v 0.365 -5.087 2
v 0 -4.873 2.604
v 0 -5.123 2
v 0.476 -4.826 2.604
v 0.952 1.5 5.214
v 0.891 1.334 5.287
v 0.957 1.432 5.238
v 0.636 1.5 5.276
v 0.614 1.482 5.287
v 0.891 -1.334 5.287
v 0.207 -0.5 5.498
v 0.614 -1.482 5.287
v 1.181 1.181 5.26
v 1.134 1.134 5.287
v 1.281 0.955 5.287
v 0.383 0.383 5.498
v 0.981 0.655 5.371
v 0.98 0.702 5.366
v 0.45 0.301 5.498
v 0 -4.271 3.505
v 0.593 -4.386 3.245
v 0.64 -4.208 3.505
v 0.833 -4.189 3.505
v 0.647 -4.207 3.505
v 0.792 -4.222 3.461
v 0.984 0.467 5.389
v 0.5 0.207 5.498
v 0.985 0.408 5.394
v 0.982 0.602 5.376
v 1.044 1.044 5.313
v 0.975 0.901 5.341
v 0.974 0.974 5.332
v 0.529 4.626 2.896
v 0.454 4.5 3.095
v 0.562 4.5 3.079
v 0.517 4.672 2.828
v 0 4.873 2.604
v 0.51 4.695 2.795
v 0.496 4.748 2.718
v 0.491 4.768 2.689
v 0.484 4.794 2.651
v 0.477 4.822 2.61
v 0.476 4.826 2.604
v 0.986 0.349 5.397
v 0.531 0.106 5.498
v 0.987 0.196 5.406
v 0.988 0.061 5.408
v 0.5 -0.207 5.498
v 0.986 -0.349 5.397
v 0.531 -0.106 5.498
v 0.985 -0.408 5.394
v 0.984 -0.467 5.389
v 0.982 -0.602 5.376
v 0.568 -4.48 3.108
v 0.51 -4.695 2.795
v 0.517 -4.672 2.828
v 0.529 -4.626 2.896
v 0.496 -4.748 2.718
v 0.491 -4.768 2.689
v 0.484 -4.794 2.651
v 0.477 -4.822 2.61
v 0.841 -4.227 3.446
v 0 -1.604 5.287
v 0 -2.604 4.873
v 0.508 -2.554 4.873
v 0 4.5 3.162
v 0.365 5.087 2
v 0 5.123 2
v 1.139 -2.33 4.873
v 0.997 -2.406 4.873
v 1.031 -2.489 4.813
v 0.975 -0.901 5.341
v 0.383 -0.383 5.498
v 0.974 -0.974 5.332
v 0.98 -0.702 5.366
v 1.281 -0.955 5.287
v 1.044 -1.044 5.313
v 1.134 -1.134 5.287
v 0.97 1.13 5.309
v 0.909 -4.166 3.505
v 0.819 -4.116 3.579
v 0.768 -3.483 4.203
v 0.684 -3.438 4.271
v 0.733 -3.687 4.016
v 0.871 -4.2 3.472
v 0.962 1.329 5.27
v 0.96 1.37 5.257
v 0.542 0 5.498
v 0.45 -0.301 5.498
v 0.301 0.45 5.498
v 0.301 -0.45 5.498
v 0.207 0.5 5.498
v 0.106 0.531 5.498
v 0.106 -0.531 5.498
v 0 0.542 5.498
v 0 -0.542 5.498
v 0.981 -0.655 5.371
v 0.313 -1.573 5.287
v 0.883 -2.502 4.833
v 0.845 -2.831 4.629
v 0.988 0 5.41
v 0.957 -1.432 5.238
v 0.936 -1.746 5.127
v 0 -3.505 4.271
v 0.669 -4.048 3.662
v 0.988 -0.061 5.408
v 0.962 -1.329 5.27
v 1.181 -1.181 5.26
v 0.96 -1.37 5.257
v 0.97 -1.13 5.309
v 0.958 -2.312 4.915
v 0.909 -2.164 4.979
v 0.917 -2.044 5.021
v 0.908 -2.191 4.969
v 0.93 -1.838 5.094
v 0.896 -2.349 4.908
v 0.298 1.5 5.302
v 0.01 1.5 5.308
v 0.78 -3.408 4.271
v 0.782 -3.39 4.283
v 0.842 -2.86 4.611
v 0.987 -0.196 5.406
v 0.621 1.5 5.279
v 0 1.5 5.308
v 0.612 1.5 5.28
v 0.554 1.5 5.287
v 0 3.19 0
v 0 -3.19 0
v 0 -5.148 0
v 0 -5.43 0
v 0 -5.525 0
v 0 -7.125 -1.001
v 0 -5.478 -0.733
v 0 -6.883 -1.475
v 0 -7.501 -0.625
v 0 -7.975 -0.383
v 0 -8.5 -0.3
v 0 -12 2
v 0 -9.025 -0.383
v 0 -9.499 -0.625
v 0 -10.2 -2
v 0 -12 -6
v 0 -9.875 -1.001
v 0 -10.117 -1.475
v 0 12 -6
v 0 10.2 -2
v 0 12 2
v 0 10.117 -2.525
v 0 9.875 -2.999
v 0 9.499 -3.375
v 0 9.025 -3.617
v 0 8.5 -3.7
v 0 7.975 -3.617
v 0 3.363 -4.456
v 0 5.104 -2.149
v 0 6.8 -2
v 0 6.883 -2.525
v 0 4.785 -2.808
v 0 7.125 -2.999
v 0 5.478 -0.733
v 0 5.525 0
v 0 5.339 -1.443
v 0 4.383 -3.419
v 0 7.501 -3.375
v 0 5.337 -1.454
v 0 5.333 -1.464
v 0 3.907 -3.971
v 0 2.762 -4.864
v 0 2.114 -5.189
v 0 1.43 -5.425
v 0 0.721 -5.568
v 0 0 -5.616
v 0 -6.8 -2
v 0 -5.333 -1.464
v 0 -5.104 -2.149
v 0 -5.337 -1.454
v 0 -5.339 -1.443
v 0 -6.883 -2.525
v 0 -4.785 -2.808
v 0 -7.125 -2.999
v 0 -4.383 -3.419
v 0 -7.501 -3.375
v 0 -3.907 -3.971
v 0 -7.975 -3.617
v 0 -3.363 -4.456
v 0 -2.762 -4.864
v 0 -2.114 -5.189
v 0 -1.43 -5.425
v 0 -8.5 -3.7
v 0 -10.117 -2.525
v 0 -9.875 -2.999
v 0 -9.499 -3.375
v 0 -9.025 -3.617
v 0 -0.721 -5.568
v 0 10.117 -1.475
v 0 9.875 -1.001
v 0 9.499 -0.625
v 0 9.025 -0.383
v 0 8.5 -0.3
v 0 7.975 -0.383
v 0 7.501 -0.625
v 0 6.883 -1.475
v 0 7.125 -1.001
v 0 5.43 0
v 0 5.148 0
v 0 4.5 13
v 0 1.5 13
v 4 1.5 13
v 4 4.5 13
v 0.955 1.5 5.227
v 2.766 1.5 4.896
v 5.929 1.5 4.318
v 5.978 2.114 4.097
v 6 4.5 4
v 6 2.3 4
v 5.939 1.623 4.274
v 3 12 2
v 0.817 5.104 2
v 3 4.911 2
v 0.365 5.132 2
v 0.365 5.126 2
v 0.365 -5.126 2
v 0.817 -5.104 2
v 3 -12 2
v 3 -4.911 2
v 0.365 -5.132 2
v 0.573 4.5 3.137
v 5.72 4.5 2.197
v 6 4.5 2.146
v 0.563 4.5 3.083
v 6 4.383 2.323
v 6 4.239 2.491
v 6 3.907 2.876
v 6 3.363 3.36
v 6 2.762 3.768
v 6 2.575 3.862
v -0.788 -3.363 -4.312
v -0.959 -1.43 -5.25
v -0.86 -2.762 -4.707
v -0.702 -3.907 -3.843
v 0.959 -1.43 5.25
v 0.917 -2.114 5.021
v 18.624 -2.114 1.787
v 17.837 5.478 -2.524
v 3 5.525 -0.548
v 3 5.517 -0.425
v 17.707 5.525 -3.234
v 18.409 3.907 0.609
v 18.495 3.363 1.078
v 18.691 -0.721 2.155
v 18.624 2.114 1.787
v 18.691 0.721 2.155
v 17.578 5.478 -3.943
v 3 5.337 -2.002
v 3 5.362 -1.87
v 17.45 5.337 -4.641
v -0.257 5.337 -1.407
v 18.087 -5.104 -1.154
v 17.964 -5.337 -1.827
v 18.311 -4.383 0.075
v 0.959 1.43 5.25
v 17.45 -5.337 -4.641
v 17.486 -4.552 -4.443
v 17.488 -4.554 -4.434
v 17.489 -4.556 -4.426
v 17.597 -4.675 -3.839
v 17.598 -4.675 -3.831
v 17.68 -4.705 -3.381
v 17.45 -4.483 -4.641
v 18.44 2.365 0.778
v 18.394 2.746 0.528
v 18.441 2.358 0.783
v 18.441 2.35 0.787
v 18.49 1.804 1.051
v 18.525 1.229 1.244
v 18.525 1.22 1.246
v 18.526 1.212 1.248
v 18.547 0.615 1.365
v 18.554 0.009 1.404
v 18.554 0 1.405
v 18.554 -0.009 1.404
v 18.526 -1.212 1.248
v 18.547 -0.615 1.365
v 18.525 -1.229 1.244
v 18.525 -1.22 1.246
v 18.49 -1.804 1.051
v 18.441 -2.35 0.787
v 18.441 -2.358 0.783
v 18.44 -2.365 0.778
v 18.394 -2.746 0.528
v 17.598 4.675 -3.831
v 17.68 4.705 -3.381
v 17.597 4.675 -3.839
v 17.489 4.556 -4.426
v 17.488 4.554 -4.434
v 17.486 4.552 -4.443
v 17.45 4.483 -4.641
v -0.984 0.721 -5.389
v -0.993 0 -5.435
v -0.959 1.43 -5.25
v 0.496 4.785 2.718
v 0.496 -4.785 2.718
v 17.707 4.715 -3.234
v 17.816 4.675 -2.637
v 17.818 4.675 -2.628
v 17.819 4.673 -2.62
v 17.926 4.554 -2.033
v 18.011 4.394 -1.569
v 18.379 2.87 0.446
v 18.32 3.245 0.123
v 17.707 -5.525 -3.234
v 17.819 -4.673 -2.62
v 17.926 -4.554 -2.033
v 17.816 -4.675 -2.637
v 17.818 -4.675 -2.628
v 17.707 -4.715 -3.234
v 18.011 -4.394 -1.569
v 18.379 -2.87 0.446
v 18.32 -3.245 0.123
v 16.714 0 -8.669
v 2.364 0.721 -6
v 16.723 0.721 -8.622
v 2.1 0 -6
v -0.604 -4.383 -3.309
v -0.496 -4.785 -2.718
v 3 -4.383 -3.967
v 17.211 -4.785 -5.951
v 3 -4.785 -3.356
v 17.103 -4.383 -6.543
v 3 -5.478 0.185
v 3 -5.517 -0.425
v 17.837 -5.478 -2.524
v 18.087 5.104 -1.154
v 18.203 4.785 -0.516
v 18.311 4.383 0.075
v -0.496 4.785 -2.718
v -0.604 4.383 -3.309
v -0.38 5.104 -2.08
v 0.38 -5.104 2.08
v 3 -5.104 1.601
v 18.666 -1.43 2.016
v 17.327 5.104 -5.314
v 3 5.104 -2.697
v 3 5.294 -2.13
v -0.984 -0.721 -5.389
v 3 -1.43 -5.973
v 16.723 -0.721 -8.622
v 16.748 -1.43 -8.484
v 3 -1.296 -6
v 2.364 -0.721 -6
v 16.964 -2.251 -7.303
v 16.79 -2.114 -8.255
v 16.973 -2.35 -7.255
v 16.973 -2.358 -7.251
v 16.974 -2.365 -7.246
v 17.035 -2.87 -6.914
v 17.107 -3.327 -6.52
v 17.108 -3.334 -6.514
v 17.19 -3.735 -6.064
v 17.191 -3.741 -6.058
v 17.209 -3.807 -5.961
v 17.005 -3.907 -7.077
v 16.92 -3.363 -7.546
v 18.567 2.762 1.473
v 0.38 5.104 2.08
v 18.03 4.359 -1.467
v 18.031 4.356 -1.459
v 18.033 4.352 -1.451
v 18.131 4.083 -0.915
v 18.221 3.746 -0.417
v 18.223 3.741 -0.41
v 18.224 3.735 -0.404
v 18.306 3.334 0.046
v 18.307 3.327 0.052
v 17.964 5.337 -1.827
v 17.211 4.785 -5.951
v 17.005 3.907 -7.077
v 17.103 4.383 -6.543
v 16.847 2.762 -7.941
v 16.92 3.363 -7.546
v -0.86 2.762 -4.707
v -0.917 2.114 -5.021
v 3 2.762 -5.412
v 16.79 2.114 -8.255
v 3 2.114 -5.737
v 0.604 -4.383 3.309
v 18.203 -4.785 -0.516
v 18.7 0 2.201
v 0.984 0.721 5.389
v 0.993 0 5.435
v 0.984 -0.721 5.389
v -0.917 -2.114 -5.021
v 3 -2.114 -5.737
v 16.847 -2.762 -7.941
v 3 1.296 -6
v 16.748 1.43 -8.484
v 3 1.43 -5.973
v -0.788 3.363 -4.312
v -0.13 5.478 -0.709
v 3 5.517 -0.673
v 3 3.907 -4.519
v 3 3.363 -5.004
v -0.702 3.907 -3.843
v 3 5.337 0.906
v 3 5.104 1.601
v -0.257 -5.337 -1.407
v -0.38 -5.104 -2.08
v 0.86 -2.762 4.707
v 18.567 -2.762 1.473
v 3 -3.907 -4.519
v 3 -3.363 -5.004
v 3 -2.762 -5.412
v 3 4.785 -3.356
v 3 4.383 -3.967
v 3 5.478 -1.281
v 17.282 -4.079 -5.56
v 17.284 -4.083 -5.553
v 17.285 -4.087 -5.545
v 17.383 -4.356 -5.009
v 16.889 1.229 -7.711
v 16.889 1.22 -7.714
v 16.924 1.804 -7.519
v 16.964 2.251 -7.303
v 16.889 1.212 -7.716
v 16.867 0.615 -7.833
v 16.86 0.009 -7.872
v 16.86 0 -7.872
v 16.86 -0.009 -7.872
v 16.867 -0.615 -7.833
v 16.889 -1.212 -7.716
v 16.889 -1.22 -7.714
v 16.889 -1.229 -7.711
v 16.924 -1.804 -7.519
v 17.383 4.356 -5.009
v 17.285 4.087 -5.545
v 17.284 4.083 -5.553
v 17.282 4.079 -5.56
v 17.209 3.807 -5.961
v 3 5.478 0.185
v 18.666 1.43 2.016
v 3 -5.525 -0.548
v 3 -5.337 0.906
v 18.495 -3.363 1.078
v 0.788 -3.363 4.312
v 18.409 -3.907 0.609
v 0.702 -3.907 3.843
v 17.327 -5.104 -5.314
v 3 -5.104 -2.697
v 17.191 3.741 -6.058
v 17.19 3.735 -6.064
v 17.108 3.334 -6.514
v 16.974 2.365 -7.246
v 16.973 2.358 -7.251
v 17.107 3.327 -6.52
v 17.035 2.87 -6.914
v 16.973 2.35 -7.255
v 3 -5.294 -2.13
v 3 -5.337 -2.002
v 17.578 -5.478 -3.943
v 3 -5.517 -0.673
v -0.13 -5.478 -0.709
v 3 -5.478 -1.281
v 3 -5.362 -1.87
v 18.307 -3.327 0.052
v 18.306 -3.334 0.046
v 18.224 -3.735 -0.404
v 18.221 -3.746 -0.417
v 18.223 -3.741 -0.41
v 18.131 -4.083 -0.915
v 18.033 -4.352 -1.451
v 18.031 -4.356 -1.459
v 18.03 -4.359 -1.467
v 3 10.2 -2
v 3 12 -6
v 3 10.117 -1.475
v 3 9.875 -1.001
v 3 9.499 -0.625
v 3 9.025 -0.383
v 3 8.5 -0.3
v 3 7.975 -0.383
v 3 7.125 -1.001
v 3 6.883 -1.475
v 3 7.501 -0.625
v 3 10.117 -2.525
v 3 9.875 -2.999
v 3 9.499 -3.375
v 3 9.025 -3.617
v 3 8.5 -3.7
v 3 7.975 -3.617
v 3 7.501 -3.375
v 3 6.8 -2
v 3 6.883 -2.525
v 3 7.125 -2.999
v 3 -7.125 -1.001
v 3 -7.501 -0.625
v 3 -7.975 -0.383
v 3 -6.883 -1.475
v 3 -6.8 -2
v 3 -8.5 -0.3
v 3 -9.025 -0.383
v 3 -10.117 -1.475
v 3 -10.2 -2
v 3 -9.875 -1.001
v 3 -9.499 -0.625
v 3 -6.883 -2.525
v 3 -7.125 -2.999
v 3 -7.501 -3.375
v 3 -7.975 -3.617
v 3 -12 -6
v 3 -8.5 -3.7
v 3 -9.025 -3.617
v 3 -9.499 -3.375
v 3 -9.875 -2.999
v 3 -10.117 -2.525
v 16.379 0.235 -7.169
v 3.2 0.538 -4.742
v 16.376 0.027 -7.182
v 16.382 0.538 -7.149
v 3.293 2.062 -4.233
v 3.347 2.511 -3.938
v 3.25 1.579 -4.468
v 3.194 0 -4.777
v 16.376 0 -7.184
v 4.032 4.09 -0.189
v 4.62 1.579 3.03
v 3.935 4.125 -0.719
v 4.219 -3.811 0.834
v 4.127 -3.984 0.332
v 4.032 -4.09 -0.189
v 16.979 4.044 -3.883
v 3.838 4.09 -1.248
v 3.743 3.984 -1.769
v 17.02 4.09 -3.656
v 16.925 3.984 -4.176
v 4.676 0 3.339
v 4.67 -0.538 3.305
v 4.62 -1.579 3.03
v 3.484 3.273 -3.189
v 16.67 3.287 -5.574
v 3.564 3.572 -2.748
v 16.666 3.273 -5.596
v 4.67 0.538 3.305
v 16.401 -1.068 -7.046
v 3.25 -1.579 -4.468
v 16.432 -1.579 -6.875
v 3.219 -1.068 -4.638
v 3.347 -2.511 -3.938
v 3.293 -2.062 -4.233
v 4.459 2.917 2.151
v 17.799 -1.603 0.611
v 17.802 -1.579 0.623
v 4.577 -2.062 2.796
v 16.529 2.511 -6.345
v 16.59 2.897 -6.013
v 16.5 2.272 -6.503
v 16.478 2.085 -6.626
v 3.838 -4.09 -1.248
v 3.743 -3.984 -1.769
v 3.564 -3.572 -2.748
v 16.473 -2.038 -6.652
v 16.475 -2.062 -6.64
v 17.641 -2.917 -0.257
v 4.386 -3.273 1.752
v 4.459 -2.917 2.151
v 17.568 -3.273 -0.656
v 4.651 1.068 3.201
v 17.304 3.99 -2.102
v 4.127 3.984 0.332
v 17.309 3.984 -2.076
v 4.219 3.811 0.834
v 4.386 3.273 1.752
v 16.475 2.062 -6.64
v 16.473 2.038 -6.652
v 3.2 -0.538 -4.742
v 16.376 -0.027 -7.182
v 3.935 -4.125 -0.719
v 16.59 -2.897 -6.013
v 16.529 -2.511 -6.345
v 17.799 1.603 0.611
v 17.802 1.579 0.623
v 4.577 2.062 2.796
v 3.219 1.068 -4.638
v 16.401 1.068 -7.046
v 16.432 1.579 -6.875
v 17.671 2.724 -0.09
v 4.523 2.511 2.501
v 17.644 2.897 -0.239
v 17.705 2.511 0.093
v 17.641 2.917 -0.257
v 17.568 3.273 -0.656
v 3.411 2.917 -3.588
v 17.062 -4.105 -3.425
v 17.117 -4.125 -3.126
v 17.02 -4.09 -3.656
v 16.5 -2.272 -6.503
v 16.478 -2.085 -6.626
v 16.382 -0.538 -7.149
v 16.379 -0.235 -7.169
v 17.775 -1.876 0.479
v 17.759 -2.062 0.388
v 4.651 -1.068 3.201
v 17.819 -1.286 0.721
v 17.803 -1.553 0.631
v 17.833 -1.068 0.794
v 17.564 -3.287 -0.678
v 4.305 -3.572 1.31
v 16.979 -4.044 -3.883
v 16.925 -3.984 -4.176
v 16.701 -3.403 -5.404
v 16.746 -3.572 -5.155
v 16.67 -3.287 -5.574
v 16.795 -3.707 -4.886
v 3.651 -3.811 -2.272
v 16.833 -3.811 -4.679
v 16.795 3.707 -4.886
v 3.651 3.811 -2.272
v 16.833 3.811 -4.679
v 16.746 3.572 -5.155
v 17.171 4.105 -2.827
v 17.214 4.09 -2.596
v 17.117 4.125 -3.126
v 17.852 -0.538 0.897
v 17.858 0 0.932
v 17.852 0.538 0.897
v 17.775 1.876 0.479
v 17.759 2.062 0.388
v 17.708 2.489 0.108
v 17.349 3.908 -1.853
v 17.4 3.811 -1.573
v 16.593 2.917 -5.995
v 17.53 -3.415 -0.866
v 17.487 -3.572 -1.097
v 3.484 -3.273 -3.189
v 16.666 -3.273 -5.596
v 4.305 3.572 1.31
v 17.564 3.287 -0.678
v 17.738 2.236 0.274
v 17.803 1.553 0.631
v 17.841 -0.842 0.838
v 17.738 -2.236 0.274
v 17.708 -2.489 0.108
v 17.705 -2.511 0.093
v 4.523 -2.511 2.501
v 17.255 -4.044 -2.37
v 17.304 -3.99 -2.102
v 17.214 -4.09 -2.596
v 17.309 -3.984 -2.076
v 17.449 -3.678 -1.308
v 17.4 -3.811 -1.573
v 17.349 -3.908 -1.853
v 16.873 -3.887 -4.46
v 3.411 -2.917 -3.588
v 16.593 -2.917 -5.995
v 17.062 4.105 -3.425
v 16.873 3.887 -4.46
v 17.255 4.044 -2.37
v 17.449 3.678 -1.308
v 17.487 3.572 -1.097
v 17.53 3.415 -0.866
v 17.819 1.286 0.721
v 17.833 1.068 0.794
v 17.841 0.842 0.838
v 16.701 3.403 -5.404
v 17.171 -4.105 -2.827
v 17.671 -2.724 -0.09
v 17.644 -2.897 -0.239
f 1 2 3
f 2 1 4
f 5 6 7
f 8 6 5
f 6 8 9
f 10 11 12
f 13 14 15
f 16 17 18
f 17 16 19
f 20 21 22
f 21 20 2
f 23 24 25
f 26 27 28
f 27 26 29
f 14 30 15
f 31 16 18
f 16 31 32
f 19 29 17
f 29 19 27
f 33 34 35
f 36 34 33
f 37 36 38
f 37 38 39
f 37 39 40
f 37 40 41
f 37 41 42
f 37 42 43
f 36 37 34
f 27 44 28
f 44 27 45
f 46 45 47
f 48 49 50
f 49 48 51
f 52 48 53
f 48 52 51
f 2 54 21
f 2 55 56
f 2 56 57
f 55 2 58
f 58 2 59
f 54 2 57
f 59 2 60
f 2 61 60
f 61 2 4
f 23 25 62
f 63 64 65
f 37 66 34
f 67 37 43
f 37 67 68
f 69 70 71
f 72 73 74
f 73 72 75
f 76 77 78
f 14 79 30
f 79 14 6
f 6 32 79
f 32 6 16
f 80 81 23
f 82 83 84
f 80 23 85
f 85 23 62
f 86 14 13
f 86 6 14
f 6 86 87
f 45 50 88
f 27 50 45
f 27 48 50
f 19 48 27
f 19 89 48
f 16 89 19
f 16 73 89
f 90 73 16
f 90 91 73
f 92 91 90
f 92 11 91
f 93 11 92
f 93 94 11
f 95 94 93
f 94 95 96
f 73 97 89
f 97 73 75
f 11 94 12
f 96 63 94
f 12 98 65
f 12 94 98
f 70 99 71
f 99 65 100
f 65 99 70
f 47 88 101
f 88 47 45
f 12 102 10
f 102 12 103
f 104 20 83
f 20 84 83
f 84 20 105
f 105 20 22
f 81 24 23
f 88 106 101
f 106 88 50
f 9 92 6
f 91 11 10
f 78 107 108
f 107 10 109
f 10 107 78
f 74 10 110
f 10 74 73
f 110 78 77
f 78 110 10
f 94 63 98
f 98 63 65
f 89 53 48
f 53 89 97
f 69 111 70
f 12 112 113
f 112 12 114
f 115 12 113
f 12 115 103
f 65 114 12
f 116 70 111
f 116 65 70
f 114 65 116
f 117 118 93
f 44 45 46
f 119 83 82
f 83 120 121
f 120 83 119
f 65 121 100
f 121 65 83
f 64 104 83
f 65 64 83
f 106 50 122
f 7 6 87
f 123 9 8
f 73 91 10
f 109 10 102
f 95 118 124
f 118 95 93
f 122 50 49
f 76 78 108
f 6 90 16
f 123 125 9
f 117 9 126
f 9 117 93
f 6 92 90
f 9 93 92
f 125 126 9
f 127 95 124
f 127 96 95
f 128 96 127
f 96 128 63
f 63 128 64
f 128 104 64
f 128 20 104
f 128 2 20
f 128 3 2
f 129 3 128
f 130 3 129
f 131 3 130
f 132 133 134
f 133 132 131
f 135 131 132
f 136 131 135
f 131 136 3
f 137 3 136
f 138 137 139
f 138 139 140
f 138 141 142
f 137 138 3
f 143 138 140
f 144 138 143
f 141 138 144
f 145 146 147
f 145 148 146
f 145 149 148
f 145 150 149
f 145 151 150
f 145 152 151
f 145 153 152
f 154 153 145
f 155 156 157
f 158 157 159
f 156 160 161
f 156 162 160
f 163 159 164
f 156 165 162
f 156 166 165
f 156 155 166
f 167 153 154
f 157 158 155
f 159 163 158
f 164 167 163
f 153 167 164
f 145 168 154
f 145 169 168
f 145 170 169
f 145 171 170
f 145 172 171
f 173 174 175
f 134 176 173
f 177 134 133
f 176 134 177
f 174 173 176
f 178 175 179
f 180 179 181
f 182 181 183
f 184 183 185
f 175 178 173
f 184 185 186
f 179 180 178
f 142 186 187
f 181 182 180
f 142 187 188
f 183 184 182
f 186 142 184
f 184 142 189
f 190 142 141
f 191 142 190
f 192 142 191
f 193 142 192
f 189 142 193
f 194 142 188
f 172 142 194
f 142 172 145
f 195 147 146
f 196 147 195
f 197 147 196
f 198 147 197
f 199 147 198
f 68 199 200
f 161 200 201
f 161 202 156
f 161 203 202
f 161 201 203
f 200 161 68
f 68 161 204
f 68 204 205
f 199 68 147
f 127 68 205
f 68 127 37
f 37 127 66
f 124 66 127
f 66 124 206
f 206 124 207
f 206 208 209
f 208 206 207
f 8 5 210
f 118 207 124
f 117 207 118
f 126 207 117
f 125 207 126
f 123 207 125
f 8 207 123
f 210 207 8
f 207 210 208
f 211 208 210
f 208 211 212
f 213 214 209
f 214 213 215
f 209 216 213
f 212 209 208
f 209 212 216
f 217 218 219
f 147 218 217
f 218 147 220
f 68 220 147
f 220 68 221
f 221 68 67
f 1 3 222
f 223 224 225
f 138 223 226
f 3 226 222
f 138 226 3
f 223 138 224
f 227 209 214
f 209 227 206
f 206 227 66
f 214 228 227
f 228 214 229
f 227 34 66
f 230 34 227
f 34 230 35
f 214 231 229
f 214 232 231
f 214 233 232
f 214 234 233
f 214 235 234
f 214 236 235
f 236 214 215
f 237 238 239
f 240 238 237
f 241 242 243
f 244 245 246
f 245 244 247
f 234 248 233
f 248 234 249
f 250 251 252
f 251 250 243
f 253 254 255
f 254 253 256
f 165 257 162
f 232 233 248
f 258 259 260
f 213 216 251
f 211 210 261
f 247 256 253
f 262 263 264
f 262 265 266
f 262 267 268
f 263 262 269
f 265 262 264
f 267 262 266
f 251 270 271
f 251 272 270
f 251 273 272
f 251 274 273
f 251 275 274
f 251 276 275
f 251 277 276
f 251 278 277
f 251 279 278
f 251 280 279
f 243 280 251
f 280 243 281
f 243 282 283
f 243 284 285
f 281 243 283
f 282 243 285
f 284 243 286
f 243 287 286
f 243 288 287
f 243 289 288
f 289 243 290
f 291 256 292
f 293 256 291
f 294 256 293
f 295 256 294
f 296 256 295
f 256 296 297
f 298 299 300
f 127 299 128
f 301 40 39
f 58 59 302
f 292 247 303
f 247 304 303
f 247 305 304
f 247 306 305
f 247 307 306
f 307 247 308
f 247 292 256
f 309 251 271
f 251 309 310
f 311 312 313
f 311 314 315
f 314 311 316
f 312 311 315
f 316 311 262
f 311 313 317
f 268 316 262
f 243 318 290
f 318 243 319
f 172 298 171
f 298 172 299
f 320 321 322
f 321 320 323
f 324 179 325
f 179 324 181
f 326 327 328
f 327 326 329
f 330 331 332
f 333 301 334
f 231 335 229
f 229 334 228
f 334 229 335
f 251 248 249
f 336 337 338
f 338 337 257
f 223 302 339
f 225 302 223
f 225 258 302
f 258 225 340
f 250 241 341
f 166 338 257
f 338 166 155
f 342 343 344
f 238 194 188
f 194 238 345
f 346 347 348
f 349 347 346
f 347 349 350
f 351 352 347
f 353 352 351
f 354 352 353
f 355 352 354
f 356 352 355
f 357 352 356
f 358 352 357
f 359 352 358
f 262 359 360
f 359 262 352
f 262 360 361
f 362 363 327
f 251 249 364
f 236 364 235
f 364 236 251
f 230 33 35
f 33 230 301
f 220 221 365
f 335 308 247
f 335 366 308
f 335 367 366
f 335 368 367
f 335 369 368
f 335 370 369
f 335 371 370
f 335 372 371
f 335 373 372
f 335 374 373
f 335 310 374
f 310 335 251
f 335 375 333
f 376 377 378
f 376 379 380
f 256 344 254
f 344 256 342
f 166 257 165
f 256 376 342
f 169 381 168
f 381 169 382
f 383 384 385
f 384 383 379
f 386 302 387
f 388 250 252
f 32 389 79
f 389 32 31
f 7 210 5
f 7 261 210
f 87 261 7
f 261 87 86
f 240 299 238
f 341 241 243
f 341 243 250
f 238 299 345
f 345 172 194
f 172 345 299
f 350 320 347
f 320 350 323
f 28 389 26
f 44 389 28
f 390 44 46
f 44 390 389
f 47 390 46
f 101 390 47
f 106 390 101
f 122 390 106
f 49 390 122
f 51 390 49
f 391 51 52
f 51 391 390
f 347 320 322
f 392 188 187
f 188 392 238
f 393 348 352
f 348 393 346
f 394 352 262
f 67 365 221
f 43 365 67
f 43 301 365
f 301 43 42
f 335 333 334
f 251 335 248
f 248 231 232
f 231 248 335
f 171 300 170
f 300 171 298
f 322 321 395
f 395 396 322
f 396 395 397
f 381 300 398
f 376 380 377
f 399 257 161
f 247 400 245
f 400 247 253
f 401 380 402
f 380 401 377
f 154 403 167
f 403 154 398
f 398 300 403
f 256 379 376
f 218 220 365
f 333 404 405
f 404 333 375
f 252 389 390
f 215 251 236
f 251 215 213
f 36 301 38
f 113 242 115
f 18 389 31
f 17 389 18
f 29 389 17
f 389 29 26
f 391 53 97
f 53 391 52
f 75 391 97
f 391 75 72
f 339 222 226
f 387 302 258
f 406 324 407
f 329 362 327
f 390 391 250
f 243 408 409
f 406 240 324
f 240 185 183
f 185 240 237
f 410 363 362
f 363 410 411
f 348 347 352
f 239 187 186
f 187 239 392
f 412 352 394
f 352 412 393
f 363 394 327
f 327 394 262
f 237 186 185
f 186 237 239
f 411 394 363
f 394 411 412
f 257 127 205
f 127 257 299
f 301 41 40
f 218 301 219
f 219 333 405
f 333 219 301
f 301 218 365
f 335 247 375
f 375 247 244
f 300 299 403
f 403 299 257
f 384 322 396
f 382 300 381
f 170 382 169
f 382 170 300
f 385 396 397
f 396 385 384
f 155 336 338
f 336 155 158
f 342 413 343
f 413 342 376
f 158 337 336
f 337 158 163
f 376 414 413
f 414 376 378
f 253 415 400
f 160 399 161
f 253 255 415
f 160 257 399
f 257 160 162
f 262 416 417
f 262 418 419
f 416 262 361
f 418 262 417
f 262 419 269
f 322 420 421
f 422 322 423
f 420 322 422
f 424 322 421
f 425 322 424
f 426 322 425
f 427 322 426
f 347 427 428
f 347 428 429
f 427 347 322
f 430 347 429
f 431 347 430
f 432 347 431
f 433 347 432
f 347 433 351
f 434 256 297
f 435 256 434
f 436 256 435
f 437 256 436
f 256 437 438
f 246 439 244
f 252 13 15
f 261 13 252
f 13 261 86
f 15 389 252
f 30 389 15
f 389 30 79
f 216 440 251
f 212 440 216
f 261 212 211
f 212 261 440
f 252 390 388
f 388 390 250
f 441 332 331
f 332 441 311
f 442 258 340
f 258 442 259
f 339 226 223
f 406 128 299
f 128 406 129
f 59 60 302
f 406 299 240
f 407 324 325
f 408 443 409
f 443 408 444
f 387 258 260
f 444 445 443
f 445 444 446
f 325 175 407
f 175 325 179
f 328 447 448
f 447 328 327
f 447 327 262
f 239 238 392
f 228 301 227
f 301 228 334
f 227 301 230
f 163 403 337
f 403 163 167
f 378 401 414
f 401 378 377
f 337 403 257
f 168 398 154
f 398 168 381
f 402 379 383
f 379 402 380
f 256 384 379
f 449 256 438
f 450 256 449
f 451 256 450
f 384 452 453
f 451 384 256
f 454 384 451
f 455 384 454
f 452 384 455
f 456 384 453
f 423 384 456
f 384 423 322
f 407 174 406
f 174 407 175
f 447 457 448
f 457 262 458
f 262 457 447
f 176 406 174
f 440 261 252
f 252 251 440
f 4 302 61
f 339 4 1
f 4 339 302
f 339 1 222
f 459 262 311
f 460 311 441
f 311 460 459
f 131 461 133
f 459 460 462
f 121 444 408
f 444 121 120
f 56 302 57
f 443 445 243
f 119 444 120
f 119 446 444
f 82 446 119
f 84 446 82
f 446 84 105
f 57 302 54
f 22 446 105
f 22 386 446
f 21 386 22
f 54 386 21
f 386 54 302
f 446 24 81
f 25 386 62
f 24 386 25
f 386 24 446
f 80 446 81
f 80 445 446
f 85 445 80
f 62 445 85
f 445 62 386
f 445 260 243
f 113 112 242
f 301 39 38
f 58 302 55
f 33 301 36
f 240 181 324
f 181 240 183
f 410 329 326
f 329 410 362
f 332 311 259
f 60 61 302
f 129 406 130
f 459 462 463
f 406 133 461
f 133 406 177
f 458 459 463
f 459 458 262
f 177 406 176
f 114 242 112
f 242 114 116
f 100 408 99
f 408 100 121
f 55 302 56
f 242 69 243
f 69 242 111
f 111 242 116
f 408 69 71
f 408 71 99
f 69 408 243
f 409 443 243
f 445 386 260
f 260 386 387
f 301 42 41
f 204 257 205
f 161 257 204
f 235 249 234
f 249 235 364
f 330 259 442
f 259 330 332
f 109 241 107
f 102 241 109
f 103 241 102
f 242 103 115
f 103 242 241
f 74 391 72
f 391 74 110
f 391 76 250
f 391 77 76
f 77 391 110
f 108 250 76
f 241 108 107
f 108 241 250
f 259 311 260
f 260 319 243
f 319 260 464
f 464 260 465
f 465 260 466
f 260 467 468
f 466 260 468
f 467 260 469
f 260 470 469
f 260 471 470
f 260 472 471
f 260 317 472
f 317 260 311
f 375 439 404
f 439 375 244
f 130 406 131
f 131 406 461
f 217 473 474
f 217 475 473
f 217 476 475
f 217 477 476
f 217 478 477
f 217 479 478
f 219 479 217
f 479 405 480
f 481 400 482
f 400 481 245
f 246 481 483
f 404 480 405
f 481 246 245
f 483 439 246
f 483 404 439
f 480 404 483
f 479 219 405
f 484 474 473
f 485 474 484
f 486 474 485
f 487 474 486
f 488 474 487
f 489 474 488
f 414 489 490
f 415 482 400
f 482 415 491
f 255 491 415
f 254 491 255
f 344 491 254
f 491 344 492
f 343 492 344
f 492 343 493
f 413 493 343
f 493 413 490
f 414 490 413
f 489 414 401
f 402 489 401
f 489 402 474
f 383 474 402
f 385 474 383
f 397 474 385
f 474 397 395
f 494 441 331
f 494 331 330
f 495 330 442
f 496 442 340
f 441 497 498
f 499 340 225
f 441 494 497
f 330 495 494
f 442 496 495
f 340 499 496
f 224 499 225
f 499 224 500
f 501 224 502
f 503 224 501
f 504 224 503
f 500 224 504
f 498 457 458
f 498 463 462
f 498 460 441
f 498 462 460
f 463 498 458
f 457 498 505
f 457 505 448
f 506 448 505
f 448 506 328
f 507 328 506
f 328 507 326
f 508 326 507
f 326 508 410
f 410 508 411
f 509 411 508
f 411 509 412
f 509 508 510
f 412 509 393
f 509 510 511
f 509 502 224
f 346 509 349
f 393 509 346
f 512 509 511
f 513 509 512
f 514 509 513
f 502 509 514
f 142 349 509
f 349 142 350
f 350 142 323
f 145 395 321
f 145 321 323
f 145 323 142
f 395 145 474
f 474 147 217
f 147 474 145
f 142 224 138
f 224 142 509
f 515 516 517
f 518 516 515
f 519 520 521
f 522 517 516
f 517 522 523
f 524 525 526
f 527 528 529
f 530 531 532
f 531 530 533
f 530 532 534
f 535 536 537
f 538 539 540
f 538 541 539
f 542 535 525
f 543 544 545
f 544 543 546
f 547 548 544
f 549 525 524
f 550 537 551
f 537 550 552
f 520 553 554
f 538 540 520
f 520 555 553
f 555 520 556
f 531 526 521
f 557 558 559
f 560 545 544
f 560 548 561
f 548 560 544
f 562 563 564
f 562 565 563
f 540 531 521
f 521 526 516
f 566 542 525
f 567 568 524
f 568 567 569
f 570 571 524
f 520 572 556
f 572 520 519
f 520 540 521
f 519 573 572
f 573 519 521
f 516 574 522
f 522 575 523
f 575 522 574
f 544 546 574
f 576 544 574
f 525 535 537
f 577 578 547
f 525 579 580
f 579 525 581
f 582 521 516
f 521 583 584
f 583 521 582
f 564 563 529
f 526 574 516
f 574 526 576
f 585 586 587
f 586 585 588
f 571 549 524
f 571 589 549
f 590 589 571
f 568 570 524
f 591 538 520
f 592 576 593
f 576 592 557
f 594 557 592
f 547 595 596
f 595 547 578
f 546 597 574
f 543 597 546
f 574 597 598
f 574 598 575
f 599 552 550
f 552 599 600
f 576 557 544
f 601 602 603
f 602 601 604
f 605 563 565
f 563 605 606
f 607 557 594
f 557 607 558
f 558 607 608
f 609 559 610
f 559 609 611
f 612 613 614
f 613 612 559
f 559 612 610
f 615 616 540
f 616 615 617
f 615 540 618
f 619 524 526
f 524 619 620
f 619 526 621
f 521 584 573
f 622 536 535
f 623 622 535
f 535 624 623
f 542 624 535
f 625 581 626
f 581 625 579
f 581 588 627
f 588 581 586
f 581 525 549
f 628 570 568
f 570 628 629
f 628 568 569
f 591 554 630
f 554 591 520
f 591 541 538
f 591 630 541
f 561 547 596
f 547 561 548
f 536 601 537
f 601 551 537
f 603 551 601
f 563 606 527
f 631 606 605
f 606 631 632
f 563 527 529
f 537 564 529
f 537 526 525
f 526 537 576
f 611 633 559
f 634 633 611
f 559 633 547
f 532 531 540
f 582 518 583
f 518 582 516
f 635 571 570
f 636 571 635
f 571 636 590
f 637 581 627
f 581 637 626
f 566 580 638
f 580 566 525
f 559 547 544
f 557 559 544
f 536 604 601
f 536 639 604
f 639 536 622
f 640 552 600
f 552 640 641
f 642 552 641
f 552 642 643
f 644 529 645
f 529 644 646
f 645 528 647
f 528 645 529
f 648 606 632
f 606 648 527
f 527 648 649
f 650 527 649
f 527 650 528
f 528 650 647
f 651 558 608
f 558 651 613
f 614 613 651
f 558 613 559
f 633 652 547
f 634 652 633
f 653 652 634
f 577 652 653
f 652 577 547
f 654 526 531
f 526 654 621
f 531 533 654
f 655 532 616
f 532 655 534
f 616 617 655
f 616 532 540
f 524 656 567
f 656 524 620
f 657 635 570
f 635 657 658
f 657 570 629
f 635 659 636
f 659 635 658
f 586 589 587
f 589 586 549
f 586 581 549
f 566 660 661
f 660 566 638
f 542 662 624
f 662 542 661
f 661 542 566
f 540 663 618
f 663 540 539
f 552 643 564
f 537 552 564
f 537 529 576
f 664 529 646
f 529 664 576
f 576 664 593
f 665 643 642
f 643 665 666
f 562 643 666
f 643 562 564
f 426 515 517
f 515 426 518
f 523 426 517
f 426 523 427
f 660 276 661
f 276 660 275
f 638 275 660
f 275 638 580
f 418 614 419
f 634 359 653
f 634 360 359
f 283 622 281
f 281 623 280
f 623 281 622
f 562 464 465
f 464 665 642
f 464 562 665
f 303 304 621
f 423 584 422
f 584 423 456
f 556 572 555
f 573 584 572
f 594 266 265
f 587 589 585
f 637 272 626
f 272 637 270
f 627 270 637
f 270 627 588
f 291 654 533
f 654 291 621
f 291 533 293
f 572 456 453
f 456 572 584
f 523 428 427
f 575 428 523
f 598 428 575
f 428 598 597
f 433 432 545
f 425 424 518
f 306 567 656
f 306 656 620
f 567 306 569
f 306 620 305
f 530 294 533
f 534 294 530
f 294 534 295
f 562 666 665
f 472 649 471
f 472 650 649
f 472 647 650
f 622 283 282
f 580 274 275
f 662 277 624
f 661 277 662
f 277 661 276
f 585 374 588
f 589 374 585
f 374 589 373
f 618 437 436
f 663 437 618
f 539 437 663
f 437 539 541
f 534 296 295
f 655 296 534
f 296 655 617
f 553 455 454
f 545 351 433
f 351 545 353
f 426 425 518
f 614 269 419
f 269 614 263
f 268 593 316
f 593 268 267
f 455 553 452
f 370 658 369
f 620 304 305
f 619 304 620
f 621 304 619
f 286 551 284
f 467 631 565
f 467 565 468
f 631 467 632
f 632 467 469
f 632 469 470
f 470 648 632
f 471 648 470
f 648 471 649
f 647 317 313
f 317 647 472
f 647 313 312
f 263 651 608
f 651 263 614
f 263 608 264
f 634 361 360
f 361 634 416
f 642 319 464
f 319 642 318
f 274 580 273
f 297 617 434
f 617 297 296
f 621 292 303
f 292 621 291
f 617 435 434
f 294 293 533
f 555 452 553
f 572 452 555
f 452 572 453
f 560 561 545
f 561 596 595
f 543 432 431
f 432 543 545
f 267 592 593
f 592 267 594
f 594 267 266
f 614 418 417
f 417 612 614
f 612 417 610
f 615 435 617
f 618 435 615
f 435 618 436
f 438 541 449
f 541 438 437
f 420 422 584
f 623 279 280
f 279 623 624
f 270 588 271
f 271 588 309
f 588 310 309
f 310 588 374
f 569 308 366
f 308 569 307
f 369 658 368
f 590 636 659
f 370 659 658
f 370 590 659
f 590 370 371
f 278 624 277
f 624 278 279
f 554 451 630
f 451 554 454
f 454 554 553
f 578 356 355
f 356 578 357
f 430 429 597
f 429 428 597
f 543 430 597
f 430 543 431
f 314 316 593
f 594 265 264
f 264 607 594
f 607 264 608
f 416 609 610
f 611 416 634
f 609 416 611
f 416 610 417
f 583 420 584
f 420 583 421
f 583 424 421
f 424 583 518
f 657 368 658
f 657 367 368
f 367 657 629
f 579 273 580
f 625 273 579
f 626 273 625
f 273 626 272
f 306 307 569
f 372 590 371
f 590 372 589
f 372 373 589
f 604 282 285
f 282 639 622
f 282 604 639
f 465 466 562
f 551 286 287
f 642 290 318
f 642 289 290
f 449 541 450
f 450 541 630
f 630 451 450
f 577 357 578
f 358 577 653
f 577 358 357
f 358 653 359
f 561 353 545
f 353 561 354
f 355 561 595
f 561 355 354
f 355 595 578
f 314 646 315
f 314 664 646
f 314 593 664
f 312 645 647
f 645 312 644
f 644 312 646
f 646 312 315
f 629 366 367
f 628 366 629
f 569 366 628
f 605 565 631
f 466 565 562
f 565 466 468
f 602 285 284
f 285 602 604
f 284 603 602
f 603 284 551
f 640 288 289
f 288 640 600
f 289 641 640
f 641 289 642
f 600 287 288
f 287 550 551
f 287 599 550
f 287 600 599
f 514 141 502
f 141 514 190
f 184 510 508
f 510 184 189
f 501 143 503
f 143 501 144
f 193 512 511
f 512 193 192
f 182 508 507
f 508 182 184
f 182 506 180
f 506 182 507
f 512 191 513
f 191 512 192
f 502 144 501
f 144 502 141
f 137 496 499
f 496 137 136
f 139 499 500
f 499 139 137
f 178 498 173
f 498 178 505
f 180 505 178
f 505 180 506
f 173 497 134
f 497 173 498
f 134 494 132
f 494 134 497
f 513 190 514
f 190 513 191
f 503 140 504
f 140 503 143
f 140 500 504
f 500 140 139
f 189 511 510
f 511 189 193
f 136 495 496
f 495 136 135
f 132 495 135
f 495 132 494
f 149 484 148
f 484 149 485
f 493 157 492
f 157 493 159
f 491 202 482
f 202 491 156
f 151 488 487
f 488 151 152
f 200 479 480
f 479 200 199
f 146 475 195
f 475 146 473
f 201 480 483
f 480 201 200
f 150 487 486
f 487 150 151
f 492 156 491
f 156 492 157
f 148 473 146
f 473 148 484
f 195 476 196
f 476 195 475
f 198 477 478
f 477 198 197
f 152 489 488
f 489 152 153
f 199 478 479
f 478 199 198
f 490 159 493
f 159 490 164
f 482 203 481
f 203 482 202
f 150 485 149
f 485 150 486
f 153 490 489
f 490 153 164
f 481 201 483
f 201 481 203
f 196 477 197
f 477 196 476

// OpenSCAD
// H08a_vertex_half  (qty 1; frame: node; MJF PA12; print service OK)
// GENERATED by gen_halo_stl.py from halo_parts.py. Change numbers in halo_params.scad.
// Every dimension below is an expression of the names in halo_params.scad.
include <../halo_params.scad>

difference() {
    union() {
        translate([0, 0, 0]) {
            rotate([0, acos(((SOCK_BOT + SOCK_DEPTH) * (-sin(CH_DEG / 2)) - 0) / sqrt(((SOCK_BOT + SOCK_DEPTH) * (1 * cos(CH_DEG / 2)) - 0) * ((SOCK_BOT + SOCK_DEPTH) * (1 * cos(CH_DEG / 2)) - 0) + ((SOCK_BOT + SOCK_DEPTH) * 0 - 0) * ((SOCK_BOT + SOCK_DEPTH) * 0 - 0) + ((SOCK_BOT + SOCK_DEPTH) * (-sin(CH_DEG / 2)) - 0) * ((SOCK_BOT + SOCK_DEPTH) * (-sin(CH_DEG / 2)) - 0))), atan2((SOCK_BOT + SOCK_DEPTH) * 0 - 0, (SOCK_BOT + SOCK_DEPTH) * (1 * cos(CH_DEG / 2)) - 0)]) {
                cylinder(h = sqrt(((SOCK_BOT + SOCK_DEPTH) * (1 * cos(CH_DEG / 2)) - 0) * ((SOCK_BOT + SOCK_DEPTH) * (1 * cos(CH_DEG / 2)) - 0) + ((SOCK_BOT + SOCK_DEPTH) * 0 - 0) * ((SOCK_BOT + SOCK_DEPTH) * 0 - 0) + ((SOCK_BOT + SOCK_DEPTH) * (-sin(CH_DEG / 2)) - 0) * ((SOCK_BOT + SOCK_DEPTH) * (-sin(CH_DEG / 2)) - 0)), r = SOCK_D / 2 + SOCK_WALL, center = false, $fn = 48);
            }
        }
        intersection() {
            sphere(r = SOCK_D / 2 + SOCK_WALL, $fn = 32);
            translate([0, -10, -10]) {
                cube([10, 20, 20], center = false);
            }
        }
        translate([0, -12, -6]) {
            cube([3, 24, 8], center = false);
        }
        intersection() {
            hull() {
                translate([0, -POST_N1, 2]) {
                    cube([4, -POST_N0 - (-POST_N1), TUBE_OD / 2 + POST_H - 2], center = false);
                }
                translate([-2, -POST_N1, 2]) {
                    cube([8, -POST_N0 - (-POST_N1), 2], center = false);
                }
            }
            translate([0, -20, -5]) {
                cube([20, 40, 35], center = false);
            }
        }
    }
    translate([SOCK_BOT * (1 * cos(CH_DEG / 2)), SOCK_BOT * 0, SOCK_BOT * (-sin(CH_DEG / 2))]) {
        rotate([0, acos(((SOCK_BOT + SOCK_DEPTH + 0.1) * (-sin(CH_DEG / 2)) - (SOCK_BOT * (-sin(CH_DEG / 2)))) / sqrt(((SOCK_BOT + SOCK_DEPTH + 0.1) * (1 * cos(CH_DEG / 2)) - (SOCK_BOT * (1 * cos(CH_DEG / 2)))) * ((SOCK_BOT + SOCK_DEPTH + 0.1) * (1 * cos(CH_DEG / 2)) - (SOCK_BOT * (1 * cos(CH_DEG / 2)))) + ((SOCK_BOT + SOCK_DEPTH + 0.1) * 0 - (SOCK_BOT * 0)) * ((SOCK_BOT + SOCK_DEPTH + 0.1) * 0 - (SOCK_BOT * 0)) + ((SOCK_BOT + SOCK_DEPTH + 0.1) * (-sin(CH_DEG / 2)) - (SOCK_BOT * (-sin(CH_DEG / 2)))) * ((SOCK_BOT + SOCK_DEPTH + 0.1) * (-sin(CH_DEG / 2)) - (SOCK_BOT * (-sin(CH_DEG / 2)))))), atan2((SOCK_BOT + SOCK_DEPTH + 0.1) * 0 - (SOCK_BOT * 0), (SOCK_BOT + SOCK_DEPTH + 0.1) * (1 * cos(CH_DEG / 2)) - (SOCK_BOT * (1 * cos(CH_DEG / 2))))]) {
            cylinder(h = sqrt(((SOCK_BOT + SOCK_DEPTH + 0.1) * (1 * cos(CH_DEG / 2)) - (SOCK_BOT * (1 * cos(CH_DEG / 2)))) * ((SOCK_BOT + SOCK_DEPTH + 0.1) * (1 * cos(CH_DEG / 2)) - (SOCK_BOT * (1 * cos(CH_DEG / 2)))) + ((SOCK_BOT + SOCK_DEPTH + 0.1) * 0 - (SOCK_BOT * 0)) * ((SOCK_BOT + SOCK_DEPTH + 0.1) * 0 - (SOCK_BOT * 0)) + ((SOCK_BOT + SOCK_DEPTH + 0.1) * (-sin(CH_DEG / 2)) - (SOCK_BOT * (-sin(CH_DEG / 2)))) * ((SOCK_BOT + SOCK_DEPTH + 0.1) * (-sin(CH_DEG / 2)) - (SOCK_BOT * (-sin(CH_DEG / 2))))), r = SOCK_D / 2, center = false, $fn = 48);
        }
    }
    translate([(SOCK_BOT + SOCK_DEPTH - 0.6) * (1 * cos(CH_DEG / 2)), (SOCK_BOT + SOCK_DEPTH - 0.6) * 0, (SOCK_BOT + SOCK_DEPTH - 0.6) * (-sin(CH_DEG / 2))]) {
        rotate([0, acos(((SOCK_BOT + SOCK_DEPTH + 0.01) * (-sin(CH_DEG / 2)) - ((SOCK_BOT + SOCK_DEPTH - 0.6) * (-sin(CH_DEG / 2)))) / sqrt(((SOCK_BOT + SOCK_DEPTH + 0.01) * (1 * cos(CH_DEG / 2)) - ((SOCK_BOT + SOCK_DEPTH - 0.6) * (1 * cos(CH_DEG / 2)))) * ((SOCK_BOT + SOCK_DEPTH + 0.01) * (1 * cos(CH_DEG / 2)) - ((SOCK_BOT + SOCK_DEPTH - 0.6) * (1 * cos(CH_DEG / 2)))) + ((SOCK_BOT + SOCK_DEPTH + 0.01) * 0 - ((SOCK_BOT + SOCK_DEPTH - 0.6) * 0)) * ((SOCK_BOT + SOCK_DEPTH + 0.01) * 0 - ((SOCK_BOT + SOCK_DEPTH - 0.6) * 0)) + ((SOCK_BOT + SOCK_DEPTH + 0.01) * (-sin(CH_DEG / 2)) - ((SOCK_BOT + SOCK_DEPTH - 0.6) * (-sin(CH_DEG / 2)))) * ((SOCK_BOT + SOCK_DEPTH + 0.01) * (-sin(CH_DEG / 2)) - ((SOCK_BOT + SOCK_DEPTH - 0.6) * (-sin(CH_DEG / 2)))))), atan2((SOCK_BOT + SOCK_DEPTH + 0.01) * 0 - ((SOCK_BOT + SOCK_DEPTH - 0.6) * 0), (SOCK_BOT + SOCK_DEPTH + 0.01) * (1 * cos(CH_DEG / 2)) - ((SOCK_BOT + SOCK_DEPTH - 0.6) * (1 * cos(CH_DEG / 2))))]) {
            cylinder(h = sqrt(((SOCK_BOT + SOCK_DEPTH + 0.01) * (1 * cos(CH_DEG / 2)) - ((SOCK_BOT + SOCK_DEPTH - 0.6) * (1 * cos(CH_DEG / 2)))) * ((SOCK_BOT + SOCK_DEPTH + 0.01) * (1 * cos(CH_DEG / 2)) - ((SOCK_BOT + SOCK_DEPTH - 0.6) * (1 * cos(CH_DEG / 2)))) + ((SOCK_BOT + SOCK_DEPTH + 0.01) * 0 - ((SOCK_BOT + SOCK_DEPTH - 0.6) * 0)) * ((SOCK_BOT + SOCK_DEPTH + 0.01) * 0 - ((SOCK_BOT + SOCK_DEPTH - 0.6) * 0)) + ((SOCK_BOT + SOCK_DEPTH + 0.01) * (-sin(CH_DEG / 2)) - ((SOCK_BOT + SOCK_DEPTH - 0.6) * (-sin(CH_DEG / 2)))) * ((SOCK_BOT + SOCK_DEPTH + 0.01) * (-sin(CH_DEG / 2)) - ((SOCK_BOT + SOCK_DEPTH - 0.6) * (-sin(CH_DEG / 2))))), r1 = SOCK_D / 2, r2 = SOCK_D / 2 + 0.6, center = false, $fn = 48);
        }
    }
    translate([-4, -8.5, -2]) {
        rotate([0, 90, 0]) {
            cylinder(h = 8, r = M3_CLEAR / 2, center = false, $fn = 20);
        }
    }
    translate([-4, 8.5, -2]) {
        rotate([0, 90, 0]) {
            cylinder(h = 8, r = M3_CLEAR / 2, center = false, $fn = 20);
        }
    }
}
